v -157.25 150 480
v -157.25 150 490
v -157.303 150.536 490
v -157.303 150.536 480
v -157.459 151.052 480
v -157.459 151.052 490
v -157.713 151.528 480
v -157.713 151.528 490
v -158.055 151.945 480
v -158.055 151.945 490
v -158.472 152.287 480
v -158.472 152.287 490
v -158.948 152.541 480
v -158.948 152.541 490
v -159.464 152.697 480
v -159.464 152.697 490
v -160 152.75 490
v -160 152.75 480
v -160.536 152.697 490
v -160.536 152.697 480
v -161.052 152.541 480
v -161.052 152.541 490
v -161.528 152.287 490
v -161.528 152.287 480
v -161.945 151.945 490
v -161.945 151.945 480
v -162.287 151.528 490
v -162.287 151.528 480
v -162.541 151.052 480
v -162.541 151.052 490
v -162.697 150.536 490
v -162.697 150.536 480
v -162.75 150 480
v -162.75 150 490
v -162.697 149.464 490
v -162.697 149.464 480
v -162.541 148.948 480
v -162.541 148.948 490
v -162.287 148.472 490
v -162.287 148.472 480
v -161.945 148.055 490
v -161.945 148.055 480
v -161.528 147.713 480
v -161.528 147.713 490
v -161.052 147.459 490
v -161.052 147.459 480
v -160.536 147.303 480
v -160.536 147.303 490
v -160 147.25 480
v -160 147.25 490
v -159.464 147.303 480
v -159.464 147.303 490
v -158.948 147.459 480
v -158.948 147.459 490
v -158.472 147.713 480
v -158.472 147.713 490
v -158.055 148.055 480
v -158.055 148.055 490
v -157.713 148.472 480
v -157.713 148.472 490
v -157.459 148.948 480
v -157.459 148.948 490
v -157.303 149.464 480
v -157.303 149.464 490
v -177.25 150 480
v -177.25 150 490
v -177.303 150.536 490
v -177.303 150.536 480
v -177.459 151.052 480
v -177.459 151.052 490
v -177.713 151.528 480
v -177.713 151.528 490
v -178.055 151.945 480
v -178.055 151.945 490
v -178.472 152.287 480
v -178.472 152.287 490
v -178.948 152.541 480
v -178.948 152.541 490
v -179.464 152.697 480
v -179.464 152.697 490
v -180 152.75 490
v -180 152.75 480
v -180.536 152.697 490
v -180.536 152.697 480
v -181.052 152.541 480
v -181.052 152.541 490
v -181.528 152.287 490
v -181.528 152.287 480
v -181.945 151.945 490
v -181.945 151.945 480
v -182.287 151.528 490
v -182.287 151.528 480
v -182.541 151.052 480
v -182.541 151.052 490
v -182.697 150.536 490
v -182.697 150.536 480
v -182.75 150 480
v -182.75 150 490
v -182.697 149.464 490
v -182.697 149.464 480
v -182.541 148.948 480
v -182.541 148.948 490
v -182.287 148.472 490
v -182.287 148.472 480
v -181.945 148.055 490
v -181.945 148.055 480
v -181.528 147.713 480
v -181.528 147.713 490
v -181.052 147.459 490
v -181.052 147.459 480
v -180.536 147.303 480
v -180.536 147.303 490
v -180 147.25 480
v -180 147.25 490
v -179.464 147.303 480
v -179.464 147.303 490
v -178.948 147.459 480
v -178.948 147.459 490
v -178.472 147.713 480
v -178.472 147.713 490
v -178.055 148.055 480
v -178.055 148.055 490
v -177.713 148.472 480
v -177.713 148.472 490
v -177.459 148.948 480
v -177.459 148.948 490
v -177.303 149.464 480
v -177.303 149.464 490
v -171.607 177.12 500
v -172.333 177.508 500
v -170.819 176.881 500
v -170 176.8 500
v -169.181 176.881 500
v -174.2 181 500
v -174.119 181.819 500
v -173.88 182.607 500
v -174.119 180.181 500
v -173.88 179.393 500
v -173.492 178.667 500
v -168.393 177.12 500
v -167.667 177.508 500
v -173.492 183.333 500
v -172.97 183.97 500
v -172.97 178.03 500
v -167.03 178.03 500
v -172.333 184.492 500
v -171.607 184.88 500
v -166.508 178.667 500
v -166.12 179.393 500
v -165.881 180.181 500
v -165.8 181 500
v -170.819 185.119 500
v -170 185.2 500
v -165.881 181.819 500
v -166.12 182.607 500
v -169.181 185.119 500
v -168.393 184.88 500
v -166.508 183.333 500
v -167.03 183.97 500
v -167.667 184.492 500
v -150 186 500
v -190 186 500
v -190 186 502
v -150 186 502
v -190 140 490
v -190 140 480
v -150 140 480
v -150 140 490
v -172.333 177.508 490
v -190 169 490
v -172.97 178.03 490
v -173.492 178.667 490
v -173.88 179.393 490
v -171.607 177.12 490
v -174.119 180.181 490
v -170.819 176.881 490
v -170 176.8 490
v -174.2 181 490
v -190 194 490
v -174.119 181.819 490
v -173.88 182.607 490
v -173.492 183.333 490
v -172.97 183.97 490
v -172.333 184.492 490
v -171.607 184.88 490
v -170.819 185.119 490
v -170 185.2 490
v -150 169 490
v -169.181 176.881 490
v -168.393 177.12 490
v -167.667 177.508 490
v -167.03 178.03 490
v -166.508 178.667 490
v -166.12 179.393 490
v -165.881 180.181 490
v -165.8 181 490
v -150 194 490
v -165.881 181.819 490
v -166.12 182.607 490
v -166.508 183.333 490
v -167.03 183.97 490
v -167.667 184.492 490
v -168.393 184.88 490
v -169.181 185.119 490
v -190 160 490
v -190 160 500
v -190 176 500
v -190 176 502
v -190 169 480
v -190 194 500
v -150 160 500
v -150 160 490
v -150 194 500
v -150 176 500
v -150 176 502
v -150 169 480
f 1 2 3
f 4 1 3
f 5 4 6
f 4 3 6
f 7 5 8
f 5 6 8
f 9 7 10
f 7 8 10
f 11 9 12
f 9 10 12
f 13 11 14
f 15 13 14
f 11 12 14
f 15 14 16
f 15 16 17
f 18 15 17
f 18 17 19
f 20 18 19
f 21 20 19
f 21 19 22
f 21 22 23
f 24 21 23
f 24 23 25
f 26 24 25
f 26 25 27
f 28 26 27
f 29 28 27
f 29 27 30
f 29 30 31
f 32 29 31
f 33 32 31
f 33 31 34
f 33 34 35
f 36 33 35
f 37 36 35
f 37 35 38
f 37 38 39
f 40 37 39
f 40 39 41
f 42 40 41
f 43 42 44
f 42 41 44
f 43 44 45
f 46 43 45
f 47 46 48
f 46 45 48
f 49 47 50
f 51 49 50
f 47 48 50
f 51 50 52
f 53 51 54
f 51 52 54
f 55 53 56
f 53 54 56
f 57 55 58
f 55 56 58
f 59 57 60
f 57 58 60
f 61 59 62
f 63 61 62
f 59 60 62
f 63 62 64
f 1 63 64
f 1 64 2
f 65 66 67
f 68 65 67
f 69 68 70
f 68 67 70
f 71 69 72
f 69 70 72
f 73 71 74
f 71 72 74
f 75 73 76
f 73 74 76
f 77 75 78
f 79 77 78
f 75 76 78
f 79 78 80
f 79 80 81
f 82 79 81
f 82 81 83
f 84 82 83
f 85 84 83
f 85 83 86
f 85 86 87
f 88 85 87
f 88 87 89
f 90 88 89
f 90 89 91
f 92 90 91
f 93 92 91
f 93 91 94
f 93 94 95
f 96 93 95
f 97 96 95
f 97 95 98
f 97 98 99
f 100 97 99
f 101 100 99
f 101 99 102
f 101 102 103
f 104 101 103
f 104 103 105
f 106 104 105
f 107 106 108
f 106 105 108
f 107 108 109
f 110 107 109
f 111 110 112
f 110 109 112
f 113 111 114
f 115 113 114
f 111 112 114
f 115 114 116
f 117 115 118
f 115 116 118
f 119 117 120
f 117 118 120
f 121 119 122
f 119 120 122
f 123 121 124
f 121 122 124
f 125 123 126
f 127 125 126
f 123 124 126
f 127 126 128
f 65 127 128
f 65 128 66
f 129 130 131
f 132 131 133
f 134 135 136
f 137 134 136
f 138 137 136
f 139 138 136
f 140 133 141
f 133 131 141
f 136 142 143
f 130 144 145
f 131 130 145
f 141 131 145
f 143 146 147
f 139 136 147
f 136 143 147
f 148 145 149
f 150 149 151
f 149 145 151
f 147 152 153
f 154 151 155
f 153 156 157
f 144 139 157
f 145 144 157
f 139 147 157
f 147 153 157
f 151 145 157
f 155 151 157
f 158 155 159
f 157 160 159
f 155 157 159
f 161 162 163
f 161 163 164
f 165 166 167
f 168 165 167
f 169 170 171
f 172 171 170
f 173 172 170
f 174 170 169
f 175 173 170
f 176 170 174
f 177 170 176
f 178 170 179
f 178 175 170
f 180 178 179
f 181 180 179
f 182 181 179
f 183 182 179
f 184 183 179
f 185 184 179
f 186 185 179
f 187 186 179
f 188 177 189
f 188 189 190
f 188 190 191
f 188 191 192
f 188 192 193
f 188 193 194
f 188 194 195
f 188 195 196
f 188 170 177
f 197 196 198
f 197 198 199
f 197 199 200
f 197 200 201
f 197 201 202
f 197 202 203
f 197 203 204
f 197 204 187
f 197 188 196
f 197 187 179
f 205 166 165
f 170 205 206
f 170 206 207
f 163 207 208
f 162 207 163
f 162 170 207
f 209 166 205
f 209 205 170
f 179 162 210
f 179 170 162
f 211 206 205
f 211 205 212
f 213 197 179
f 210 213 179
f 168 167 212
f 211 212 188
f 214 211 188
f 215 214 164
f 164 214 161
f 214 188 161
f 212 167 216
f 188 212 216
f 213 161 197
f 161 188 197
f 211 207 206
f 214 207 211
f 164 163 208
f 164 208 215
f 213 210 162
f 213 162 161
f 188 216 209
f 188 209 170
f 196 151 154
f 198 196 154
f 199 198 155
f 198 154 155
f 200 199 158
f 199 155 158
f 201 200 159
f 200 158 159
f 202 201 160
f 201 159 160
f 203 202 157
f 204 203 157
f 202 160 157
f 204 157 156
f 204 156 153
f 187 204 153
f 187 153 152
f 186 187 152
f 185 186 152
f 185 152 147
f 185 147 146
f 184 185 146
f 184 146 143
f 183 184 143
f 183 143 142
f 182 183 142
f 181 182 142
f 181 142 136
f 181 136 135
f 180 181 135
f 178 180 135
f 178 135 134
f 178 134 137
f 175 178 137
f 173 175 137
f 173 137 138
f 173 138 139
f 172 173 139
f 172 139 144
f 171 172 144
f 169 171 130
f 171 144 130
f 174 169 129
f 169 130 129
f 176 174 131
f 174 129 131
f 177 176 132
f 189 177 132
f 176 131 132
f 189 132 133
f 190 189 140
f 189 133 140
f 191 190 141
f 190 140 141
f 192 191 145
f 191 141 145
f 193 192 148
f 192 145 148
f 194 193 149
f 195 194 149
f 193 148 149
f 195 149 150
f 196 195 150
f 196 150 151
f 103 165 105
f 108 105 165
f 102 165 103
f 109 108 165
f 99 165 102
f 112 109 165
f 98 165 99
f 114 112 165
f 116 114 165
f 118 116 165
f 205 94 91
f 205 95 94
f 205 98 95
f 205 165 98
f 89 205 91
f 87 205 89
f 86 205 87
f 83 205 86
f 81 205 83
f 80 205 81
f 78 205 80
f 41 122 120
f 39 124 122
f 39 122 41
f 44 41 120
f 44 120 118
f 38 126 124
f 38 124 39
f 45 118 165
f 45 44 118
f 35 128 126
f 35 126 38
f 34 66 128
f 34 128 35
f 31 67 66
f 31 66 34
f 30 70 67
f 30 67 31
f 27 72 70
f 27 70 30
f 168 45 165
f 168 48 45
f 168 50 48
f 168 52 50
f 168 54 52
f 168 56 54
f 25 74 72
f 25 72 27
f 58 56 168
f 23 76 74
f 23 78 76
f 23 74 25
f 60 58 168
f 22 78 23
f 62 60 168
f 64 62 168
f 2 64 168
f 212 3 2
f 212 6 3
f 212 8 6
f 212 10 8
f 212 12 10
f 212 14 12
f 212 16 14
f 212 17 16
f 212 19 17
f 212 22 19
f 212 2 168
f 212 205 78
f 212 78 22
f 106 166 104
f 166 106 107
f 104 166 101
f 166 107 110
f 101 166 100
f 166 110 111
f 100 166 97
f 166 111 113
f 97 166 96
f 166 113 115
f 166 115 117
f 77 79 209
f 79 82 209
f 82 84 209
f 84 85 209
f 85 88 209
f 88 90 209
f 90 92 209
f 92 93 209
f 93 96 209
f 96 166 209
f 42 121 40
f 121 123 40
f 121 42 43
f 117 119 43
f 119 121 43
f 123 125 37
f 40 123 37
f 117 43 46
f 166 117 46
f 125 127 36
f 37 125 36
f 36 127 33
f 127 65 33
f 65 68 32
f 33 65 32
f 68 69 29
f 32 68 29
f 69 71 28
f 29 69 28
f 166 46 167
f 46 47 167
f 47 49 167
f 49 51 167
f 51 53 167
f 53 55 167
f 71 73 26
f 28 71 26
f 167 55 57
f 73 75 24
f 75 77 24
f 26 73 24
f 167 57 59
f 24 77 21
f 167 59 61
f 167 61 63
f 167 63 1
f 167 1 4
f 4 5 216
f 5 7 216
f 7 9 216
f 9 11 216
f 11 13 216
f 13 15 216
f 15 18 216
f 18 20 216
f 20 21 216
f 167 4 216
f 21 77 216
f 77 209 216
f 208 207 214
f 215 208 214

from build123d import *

# Parameters (mm, degrees)
PAD020_DEPTH    = 20
SKETCH071_R     = 4.2
HOLE011_DEPTH   = 25
SKETCH072_R     = 2.75
HOLE012_DEPTH   = 25
SKETCH073_W     = 40
SKETCH073_H     = 20
POCKET025_DEPTH = 10
SKETCH074_W     = 25
SKETCH074_H     = 10
POCKET026_DEPTH = 190.001
SKETCH075_W     = 40
SKETCH075_H     = 10
PAD021_DEPTH    = 2


with BuildPart() as part:
    # Sketch070 → Pad020 (new body)
    with BuildSketch(Plane.XY.offset(480)):
        Polygon((-190, 160), (-190, 140), (-150, 140), (-150, 160), (-150, 194), (-190, 194), align=None)
    extrude(amount=PAD020_DEPTH)

    # Sketch071 (on Face8 of Pad020) → Hole011 (cut)
    with BuildSketch(Plane.XY.offset(500)):
        with Locations((-170, 181)):
            Circle(SKETCH071_R)
    extrude(amount=-HOLE011_DEPTH, mode=Mode.SUBTRACT)

    # Sketch072 (on Face5 of Hole011) → Hole012 (cut)
    with BuildSketch(Plane.XY.offset(500)):
        with Locations((-180, 150)):
            Circle(SKETCH072_R)
        with Locations((-160, 150)):
            Circle(SKETCH072_R)
    extrude(amount=-HOLE012_DEPTH, mode=Mode.SUBTRACT)

    # Sketch073 (on Face5 of Hole012) → Pocket025 (cut)
    with BuildSketch(Plane.XY.offset(500)):
        with Locations((-170, 150)):
            Rectangle(SKETCH073_W, SKETCH073_H)
    extrude(amount=-POCKET025_DEPTH, mode=Mode.SUBTRACT)

    # Sketch074 → Pocket026 (cut, through all)
    with BuildSketch(Plane.YZ):
        with Locations((181.5, 485)):
            Rectangle(SKETCH074_W, SKETCH074_H)
    extrude(amount=-POCKET026_DEPTH, mode=Mode.SUBTRACT)

    # Sketch075 (on Face13 of Pocket026) → Pad021 (join)
    with BuildSketch(Plane.XY.offset(500)):
        with Locations((-170, 181)):
            Rectangle(SKETCH075_W, SKETCH075_H)
    extrude(amount=PAD021_DEPTH)


solid = part.part
